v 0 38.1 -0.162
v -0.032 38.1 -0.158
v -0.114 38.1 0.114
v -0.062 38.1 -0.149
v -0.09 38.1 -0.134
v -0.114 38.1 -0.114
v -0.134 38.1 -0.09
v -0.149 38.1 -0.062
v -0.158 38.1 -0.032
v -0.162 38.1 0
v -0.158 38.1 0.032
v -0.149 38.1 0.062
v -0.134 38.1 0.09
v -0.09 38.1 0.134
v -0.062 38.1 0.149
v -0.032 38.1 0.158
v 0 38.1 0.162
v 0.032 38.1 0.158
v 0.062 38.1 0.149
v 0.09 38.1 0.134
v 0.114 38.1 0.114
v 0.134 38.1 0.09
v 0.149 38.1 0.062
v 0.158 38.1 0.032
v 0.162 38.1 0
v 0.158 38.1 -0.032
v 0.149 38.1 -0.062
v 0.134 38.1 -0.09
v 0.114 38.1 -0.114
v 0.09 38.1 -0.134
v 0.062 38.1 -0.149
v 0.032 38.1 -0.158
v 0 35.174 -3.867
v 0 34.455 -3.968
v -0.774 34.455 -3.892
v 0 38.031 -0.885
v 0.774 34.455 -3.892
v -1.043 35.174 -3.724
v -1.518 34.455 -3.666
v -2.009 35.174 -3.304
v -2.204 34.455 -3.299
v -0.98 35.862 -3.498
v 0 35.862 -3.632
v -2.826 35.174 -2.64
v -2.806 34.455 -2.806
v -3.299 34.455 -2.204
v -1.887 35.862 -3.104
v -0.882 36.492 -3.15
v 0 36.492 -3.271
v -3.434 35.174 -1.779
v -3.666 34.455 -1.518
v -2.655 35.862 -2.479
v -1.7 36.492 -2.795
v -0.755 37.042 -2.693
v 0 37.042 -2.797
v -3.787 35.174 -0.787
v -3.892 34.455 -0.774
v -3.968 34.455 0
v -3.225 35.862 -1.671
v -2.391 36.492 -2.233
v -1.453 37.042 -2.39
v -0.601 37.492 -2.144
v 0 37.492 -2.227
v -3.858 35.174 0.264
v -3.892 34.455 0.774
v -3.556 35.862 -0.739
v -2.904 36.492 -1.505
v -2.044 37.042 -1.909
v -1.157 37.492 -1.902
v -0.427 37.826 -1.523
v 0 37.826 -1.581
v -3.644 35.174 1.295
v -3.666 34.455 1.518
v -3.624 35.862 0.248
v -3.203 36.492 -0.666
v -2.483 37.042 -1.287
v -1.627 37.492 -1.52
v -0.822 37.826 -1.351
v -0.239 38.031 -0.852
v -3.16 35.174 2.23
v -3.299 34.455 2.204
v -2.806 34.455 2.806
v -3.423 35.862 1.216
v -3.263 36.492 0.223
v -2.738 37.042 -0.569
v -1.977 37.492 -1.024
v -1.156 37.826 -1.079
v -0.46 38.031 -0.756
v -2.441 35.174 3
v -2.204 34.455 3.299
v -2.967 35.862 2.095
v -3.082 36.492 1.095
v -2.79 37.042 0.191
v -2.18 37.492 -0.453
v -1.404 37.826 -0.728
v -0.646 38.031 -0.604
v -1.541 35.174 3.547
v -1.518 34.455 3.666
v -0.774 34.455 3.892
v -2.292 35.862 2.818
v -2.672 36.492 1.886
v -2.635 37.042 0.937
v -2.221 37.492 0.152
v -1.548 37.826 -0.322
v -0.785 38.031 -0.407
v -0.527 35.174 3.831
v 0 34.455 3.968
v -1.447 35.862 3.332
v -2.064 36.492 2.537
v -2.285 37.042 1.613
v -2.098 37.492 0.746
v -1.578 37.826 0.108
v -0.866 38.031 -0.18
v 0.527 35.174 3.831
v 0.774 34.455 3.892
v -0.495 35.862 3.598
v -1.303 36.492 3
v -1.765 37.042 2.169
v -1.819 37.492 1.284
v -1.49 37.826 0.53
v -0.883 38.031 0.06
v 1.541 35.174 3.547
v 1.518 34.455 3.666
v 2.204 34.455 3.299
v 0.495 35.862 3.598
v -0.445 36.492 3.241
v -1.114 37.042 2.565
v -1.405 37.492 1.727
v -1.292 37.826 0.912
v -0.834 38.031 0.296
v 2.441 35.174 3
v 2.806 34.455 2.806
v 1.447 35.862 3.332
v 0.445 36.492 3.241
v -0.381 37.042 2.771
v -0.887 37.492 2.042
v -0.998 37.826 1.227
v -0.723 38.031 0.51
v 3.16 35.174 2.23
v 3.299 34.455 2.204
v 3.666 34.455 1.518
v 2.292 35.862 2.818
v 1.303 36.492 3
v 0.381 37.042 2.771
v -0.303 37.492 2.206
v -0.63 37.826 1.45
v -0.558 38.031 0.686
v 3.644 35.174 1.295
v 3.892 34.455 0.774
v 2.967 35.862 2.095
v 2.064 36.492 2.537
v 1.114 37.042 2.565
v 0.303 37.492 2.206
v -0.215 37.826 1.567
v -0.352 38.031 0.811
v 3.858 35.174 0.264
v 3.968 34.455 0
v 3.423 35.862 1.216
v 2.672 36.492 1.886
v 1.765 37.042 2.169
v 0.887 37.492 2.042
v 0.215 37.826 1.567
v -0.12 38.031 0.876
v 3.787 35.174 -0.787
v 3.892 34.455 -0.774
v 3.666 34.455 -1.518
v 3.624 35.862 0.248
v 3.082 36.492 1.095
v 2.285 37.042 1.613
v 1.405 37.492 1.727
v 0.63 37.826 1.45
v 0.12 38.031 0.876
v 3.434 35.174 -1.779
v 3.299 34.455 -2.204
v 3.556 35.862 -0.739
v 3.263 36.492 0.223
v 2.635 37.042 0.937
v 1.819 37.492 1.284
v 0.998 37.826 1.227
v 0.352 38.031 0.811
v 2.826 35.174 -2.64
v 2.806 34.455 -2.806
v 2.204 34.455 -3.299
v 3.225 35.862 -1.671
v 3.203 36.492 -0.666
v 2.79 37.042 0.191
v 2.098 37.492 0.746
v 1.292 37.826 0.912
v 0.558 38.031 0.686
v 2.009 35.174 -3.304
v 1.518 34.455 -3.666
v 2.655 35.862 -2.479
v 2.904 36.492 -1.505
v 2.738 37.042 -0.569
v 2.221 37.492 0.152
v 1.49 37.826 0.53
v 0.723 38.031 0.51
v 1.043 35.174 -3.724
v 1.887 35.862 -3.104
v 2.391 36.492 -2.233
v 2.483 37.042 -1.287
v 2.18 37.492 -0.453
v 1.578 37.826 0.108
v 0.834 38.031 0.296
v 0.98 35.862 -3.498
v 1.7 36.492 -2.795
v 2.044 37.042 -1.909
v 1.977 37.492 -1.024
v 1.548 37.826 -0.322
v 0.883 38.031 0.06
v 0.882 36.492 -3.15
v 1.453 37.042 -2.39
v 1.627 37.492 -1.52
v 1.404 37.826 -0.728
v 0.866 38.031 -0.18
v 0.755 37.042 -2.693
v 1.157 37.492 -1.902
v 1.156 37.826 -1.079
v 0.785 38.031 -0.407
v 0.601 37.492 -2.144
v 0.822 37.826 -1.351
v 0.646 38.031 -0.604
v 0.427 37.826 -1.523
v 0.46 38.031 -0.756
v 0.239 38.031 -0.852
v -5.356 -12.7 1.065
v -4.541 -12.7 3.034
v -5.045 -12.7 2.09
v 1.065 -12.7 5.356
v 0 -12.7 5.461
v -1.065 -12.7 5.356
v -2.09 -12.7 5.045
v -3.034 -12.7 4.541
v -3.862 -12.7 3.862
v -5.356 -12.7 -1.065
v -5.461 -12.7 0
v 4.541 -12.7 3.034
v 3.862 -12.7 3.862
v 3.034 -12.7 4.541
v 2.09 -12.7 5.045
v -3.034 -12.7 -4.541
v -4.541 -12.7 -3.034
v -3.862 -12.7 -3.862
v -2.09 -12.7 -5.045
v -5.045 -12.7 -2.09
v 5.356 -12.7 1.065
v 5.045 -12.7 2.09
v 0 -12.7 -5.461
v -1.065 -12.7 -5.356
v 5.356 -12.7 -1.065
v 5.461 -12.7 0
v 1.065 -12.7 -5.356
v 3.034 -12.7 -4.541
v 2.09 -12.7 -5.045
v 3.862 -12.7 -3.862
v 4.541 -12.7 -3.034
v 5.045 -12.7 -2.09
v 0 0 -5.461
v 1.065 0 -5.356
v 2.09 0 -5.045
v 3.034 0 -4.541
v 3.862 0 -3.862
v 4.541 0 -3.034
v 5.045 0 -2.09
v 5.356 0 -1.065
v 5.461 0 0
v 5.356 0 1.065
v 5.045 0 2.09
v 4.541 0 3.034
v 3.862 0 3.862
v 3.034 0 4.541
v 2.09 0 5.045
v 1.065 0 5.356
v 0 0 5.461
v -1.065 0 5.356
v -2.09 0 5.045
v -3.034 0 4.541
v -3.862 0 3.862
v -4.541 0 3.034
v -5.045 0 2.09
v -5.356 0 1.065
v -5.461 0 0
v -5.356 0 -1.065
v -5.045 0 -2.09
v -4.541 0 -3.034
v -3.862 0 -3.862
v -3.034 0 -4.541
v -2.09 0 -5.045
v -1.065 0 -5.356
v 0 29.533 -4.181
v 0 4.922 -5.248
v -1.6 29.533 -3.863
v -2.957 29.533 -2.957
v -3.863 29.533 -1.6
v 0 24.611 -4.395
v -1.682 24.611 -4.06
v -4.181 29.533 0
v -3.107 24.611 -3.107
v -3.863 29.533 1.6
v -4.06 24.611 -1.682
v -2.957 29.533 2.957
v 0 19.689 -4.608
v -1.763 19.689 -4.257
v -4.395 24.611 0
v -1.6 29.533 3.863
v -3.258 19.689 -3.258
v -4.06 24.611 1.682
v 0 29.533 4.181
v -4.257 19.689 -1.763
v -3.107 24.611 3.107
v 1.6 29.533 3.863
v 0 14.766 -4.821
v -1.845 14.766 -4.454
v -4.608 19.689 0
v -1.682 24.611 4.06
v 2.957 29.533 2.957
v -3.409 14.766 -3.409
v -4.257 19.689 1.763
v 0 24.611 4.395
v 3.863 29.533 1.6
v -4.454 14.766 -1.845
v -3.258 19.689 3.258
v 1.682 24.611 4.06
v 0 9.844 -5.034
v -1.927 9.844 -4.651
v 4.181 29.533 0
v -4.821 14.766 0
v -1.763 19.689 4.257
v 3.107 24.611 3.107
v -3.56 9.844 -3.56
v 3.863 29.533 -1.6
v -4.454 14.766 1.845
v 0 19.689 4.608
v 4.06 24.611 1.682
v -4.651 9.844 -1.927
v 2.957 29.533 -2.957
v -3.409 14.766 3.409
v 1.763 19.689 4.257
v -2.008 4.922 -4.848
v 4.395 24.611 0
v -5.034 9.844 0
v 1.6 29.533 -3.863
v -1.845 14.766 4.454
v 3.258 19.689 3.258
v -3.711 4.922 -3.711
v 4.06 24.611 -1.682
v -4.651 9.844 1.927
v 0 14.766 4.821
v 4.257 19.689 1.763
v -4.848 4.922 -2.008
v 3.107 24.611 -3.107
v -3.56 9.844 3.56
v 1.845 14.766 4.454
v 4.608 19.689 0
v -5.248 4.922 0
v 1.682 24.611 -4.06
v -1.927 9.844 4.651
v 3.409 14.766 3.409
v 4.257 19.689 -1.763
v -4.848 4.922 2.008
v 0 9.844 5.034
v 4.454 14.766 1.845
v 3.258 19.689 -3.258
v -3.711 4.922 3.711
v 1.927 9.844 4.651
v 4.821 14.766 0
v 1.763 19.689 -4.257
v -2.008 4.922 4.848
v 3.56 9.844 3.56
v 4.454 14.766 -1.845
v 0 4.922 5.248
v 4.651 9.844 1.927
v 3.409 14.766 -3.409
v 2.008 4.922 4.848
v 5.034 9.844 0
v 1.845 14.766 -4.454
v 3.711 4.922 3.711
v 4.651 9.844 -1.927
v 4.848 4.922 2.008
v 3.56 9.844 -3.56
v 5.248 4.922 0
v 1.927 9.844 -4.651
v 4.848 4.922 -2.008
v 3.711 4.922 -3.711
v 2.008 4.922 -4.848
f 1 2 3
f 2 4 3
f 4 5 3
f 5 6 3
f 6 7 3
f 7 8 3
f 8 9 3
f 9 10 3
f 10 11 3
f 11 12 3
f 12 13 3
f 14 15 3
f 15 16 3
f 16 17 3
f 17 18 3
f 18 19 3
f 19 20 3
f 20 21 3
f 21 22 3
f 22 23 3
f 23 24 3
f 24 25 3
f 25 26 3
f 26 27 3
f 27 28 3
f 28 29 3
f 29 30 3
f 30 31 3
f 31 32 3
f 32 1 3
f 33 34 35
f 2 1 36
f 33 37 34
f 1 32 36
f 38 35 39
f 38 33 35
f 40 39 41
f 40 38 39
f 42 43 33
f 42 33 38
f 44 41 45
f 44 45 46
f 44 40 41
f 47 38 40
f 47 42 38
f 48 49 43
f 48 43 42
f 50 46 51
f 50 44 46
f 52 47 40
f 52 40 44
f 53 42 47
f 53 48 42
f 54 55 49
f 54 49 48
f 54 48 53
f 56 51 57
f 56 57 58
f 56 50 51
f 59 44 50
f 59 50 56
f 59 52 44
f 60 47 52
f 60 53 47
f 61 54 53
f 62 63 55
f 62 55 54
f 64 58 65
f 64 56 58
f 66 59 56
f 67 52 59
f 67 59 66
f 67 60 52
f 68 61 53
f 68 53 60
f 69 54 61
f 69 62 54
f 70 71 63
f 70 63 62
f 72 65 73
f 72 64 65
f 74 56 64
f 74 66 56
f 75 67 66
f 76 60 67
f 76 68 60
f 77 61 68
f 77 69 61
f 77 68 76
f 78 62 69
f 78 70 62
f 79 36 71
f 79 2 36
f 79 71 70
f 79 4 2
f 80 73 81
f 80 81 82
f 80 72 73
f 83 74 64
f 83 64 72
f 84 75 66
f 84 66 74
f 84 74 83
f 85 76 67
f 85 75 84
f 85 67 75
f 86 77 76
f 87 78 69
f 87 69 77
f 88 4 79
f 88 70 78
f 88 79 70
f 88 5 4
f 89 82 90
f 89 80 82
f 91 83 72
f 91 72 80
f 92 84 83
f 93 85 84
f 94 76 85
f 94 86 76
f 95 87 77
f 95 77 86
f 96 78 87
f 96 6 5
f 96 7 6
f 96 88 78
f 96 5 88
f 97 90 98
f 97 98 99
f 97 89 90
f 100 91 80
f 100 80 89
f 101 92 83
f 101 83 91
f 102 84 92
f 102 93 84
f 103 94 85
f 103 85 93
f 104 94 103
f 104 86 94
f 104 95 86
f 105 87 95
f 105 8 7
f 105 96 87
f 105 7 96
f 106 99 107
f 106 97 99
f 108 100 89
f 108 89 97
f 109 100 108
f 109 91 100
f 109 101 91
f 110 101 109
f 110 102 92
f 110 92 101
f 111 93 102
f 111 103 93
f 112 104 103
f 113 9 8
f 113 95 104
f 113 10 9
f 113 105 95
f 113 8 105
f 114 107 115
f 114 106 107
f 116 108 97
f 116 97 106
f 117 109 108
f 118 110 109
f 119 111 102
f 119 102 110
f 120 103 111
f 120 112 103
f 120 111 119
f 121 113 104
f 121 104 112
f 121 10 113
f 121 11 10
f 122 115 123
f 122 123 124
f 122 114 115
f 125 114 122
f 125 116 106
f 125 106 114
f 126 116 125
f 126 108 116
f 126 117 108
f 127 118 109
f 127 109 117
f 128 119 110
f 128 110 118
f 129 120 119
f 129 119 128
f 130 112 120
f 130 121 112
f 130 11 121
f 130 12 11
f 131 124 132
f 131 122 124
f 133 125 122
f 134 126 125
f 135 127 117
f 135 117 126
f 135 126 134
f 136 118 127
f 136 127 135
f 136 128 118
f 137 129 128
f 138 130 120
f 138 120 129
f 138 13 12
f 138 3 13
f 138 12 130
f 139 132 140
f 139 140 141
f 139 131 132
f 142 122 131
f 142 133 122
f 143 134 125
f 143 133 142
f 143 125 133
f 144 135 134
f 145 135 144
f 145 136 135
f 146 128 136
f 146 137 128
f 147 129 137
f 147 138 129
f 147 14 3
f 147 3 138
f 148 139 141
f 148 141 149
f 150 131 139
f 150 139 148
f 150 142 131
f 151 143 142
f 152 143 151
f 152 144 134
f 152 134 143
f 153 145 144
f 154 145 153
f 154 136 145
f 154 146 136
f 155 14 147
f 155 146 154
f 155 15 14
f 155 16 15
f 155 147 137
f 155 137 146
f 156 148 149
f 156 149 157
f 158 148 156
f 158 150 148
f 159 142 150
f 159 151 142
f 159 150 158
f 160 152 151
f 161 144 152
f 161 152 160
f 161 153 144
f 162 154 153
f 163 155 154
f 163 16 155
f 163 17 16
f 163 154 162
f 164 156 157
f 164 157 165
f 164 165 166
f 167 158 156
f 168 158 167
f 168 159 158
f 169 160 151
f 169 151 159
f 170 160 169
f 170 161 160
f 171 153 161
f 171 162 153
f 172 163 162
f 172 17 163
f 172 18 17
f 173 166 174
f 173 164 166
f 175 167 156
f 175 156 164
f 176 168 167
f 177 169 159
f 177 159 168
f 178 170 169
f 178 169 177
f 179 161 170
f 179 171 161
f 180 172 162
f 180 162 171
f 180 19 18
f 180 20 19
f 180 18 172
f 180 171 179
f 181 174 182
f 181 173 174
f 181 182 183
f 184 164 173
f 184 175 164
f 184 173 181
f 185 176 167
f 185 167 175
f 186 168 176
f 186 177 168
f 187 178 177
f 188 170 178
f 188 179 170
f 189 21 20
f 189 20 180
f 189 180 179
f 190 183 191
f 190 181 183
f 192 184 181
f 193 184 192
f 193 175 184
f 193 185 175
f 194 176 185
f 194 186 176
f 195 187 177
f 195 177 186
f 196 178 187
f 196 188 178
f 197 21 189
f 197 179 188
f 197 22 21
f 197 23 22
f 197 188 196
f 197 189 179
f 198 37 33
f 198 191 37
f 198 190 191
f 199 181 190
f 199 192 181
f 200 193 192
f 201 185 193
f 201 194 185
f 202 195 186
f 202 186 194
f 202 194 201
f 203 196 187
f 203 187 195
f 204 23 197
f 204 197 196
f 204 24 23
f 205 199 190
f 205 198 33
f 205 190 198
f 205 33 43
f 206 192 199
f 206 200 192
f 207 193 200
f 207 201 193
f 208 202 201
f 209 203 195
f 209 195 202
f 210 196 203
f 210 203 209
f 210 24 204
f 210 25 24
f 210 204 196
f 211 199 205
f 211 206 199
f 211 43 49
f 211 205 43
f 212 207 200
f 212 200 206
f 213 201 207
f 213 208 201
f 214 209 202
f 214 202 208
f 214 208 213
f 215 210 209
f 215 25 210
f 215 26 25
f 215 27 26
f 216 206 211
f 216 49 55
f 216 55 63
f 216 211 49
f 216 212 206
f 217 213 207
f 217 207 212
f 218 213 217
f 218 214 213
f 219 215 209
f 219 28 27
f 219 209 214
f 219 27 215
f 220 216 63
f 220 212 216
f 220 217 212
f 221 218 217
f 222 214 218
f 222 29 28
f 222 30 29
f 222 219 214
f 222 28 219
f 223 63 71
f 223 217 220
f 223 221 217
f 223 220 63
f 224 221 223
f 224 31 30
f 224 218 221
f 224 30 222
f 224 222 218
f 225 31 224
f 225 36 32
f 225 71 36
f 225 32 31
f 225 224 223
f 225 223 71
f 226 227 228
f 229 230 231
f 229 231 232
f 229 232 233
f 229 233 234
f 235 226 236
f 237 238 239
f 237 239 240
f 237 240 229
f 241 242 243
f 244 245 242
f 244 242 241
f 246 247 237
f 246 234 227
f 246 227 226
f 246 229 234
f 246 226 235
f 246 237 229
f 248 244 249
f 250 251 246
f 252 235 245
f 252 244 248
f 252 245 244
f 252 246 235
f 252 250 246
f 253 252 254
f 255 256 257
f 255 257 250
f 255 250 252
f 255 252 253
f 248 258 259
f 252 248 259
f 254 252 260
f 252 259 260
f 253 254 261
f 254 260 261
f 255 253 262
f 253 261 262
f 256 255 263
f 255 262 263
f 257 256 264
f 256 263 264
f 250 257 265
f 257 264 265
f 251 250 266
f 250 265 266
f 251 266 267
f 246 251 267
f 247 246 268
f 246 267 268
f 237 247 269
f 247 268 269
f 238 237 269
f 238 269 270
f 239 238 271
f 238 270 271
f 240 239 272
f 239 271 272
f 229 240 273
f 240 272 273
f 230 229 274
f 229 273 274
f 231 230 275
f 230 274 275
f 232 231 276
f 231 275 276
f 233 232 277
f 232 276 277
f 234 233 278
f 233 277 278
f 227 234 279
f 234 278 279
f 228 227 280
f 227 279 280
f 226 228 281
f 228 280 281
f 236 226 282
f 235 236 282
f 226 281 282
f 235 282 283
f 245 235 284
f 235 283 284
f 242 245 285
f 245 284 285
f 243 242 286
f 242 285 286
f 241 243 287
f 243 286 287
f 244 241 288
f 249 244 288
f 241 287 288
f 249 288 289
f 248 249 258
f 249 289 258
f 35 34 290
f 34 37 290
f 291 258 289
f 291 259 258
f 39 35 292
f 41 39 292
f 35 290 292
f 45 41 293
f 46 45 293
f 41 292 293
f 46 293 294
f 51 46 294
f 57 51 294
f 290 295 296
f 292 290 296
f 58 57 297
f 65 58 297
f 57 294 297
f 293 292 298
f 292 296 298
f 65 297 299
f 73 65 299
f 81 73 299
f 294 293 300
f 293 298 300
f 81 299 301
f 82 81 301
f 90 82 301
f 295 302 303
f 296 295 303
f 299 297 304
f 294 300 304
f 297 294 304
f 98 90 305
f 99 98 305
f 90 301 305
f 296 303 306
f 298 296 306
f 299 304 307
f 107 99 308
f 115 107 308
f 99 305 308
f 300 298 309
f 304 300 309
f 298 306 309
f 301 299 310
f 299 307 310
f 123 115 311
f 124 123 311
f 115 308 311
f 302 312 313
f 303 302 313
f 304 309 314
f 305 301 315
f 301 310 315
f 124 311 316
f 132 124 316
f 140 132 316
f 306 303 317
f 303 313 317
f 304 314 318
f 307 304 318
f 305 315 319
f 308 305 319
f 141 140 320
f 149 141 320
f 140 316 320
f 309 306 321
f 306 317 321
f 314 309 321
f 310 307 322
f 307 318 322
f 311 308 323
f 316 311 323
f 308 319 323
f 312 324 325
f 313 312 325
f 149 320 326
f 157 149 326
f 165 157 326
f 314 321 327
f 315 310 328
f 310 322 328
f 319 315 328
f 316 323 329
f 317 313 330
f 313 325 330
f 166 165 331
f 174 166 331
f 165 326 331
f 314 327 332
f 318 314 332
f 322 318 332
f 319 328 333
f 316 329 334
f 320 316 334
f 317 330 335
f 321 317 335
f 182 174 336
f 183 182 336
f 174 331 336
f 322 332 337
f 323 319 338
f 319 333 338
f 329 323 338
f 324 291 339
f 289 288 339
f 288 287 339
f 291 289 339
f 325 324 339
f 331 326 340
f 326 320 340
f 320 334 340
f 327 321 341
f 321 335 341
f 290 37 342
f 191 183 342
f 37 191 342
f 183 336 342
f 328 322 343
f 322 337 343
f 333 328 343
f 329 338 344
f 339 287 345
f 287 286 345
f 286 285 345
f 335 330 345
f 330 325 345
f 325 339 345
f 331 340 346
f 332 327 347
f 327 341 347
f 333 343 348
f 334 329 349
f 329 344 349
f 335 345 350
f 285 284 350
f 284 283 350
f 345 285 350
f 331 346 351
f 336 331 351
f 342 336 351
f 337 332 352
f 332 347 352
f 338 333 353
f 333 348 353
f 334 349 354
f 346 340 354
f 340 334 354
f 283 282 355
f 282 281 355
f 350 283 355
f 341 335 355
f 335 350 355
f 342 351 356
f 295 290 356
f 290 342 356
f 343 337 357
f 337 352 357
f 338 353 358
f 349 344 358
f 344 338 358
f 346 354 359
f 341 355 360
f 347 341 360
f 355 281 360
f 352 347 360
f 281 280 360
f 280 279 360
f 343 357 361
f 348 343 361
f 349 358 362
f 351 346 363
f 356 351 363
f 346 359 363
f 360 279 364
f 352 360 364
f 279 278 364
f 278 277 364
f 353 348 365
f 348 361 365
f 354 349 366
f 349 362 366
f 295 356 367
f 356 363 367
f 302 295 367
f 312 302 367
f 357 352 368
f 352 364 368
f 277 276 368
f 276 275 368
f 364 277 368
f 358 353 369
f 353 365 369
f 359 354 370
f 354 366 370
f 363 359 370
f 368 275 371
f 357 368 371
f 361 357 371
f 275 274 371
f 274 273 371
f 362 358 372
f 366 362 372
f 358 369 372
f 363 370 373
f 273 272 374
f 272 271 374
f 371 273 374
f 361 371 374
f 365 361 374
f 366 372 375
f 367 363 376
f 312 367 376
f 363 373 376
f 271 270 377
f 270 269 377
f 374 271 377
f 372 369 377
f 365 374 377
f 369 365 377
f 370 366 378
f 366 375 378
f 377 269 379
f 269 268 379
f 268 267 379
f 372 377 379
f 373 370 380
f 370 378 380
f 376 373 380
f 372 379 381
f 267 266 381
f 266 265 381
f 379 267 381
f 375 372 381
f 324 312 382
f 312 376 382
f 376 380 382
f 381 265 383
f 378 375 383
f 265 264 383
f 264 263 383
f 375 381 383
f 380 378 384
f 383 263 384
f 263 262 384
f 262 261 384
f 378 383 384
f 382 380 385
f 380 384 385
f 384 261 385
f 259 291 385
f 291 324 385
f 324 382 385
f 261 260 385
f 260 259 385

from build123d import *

# Parameters (mm, degrees)
SKETCH2_R           = 5.461
BOSS_EXTRUDE1_DEPTH = 12.7
FILLET1_R           = 3.81


with BuildPart() as part:
    # Sketch1 → Revolve1 (revolve)
    with BuildSketch(Plane.XY, mode=Mode.PRIVATE) as revolve1_sk:
        Polygon((0, 0), (0, 38.1), (3.81, 38.1), (5.461, 0), align=None)
    revolve(revolve1_sk.sketch.rotate(Axis((0, 0, 0), (0, 1, 0)), 90), axis=Axis((0, 0, 0), (0, 1, 0)))

    # Sketch2 → Boss-Extrude1 (add)
    with BuildSketch(Plane(origin=(0, 0, 0), x_dir=(-1, 0, 0), z_dir=(0, -1, 0))):
        with Locations(Location((0, 0, 0), (0, 0, 90))):
            Circle(SKETCH2_R)
    extrude(amount=BOSS_EXTRUDE1_DEPTH)

    # Fillet1
    fillet1_edges = [part.edges().sort_by_distance(p)[0] for p in [
        (0, 38.1, 3.81),
    ]]
    fillet(fillet1_edges, radius=FILLET1_R)


solid = part.part
